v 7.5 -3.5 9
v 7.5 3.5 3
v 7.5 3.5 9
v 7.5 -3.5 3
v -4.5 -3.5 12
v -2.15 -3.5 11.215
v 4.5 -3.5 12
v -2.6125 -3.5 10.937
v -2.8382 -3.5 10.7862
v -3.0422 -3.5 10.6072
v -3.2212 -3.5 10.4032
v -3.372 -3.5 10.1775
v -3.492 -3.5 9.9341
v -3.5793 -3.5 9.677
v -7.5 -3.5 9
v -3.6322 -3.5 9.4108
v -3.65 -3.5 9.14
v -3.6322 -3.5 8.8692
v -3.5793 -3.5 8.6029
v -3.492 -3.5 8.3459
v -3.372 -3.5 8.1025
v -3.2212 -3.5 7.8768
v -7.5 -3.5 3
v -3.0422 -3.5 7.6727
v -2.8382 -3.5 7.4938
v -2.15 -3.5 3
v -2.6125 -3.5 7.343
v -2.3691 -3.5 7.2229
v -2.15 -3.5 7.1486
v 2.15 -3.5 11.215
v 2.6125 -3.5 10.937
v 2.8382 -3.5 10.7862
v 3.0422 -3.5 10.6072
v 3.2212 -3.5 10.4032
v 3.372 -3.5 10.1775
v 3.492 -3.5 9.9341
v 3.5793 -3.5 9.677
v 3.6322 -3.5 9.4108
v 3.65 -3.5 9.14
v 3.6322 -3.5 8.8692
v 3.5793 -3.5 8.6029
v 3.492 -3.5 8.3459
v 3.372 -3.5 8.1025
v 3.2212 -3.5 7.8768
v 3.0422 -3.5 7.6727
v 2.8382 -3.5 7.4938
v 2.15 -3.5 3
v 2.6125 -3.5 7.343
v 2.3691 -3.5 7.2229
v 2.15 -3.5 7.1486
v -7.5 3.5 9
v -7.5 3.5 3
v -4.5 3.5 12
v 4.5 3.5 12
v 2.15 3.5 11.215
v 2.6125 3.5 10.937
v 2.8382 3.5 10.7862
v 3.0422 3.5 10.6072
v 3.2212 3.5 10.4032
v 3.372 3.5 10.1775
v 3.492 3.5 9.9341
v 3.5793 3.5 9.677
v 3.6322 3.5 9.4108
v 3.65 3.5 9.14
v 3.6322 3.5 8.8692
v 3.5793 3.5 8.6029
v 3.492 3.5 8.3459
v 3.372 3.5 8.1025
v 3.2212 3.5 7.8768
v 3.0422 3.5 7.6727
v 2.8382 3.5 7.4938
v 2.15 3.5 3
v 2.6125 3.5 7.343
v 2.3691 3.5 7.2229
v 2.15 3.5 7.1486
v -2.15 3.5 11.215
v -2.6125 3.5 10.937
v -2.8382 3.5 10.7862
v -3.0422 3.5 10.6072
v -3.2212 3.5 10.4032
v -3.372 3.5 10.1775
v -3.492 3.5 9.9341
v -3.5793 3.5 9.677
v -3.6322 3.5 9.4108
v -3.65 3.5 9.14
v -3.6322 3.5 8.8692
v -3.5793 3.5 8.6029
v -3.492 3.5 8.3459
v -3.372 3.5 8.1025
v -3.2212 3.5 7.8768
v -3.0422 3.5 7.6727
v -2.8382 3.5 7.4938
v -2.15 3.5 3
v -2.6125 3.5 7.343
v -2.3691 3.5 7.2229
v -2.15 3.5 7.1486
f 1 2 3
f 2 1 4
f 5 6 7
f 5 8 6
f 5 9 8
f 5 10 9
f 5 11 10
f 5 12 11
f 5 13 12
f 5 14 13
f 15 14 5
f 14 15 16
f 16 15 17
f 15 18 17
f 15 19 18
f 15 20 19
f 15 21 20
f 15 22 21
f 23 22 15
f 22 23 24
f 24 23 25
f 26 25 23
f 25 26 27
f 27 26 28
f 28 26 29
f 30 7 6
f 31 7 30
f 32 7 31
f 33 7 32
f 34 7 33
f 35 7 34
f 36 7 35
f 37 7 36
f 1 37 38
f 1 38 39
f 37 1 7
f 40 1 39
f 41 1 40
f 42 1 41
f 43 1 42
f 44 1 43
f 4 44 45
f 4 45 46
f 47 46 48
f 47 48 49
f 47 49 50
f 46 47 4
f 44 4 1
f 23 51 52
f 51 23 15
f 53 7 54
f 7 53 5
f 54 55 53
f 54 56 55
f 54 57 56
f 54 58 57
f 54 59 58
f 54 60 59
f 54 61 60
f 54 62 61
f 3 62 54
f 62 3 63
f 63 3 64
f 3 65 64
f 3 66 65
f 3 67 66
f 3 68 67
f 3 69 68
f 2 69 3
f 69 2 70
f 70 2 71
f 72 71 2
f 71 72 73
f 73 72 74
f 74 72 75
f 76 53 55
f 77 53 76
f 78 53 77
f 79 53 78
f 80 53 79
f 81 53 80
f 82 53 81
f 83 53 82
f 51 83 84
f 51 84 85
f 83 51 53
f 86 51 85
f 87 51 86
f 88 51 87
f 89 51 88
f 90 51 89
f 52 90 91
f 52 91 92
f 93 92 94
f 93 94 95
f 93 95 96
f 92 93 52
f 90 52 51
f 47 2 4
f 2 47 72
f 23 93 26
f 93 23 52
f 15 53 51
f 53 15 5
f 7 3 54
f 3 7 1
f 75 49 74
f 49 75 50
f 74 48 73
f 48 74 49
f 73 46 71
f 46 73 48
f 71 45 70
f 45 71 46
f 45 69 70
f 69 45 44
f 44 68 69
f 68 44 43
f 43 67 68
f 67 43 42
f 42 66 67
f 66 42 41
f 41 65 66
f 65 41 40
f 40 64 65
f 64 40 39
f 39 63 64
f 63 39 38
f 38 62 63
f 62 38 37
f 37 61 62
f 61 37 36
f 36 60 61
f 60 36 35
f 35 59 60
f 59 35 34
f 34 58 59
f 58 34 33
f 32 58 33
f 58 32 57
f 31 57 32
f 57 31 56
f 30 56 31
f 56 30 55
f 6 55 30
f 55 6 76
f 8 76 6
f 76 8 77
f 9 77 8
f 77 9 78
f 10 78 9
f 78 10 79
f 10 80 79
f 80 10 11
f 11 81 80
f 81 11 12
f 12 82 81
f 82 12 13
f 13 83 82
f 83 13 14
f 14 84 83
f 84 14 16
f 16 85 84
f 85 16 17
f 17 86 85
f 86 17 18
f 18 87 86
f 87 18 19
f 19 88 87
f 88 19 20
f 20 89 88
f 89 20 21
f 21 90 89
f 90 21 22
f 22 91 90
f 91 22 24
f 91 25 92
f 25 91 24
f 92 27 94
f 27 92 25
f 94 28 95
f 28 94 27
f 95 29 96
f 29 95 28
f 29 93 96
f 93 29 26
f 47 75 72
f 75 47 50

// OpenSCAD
// TPU insert starting point for the walkie-talkie carabiner arch.
// This part models the negative space of the arch opening in
// carabiner_arch.scad so it can be trimmed into a soft carabiner liner.

// Keep these in sync with carabiner_arch.scad.
insert_width = 7;
arch_cutout_width = 15;
carabiner_clearance_height = 12;
inner_arch_chamfer = 3;
bottom_trim = 3;

// Carabiner relief dimensions. The squeeze value makes the printed cutout
// smaller than the measured carabiner so TPU compresses around it.
carabiner_cutout_z_depth = 9;
carabiner_cutout_top_width = 8;
carabiner_cutout_stalk_width = 5;
carabiner_cutout_mushroom_height = 4.5;
carabiner_squeeze = 0.7;
carabiner_cutout_z_offset = 2;

$fn = 48;

module xz_extrude(width) {
    translate([0, width/2, 0])
        rotate([90, 0, 0])
            linear_extrude(height=width)
                children();
}

module arch_negative_space() {
    chamfer = min(inner_arch_chamfer, arch_cutout_width/2, carabiner_clearance_height);

    xz_extrude(insert_width)
        polygon([
            [-arch_cutout_width/2, bottom_trim],
            [arch_cutout_width/2, bottom_trim],
            [arch_cutout_width/2, carabiner_clearance_height - chamfer],
            [arch_cutout_width/2 - chamfer, carabiner_clearance_height],
            [-arch_cutout_width/2 + chamfer, carabiner_clearance_height],
            [-arch_cutout_width/2, carabiner_clearance_height - chamfer]
        ]);
}

module carabiner_cutout_profile() {
    cutout_depth = carabiner_cutout_z_depth - carabiner_squeeze;
    cap_width = carabiner_cutout_top_width - carabiner_squeeze;
    stalk_width = carabiner_cutout_stalk_width - carabiner_squeeze;
    cap_height = carabiner_cutout_mushroom_height - carabiner_squeeze/2;
    stalk_height = cutout_depth - cap_height + carabiner_cutout_z_offset;
    z0 = bottom_trim - 0.01;

    union() {
        translate([-stalk_width/2, z0])
            square([stalk_width, stalk_height + 0.01]);

        translate([0, z0 + stalk_height])
            hull() {
                translate([-cap_width/2 + cap_height/2, 0])
                    circle(d=cap_height);

                translate([cap_width/2 - cap_height/2, 0])
                    circle(d=cap_height);

                translate([-stalk_width/2, 0])
                    square([stalk_width, cap_height/2]);
            }
    }
}

module carabiner_cutout() {
    xz_extrude(insert_width + 0.2)
        carabiner_cutout_profile();
}

difference() {
    arch_negative_space();
    carabiner_cutout();
}
